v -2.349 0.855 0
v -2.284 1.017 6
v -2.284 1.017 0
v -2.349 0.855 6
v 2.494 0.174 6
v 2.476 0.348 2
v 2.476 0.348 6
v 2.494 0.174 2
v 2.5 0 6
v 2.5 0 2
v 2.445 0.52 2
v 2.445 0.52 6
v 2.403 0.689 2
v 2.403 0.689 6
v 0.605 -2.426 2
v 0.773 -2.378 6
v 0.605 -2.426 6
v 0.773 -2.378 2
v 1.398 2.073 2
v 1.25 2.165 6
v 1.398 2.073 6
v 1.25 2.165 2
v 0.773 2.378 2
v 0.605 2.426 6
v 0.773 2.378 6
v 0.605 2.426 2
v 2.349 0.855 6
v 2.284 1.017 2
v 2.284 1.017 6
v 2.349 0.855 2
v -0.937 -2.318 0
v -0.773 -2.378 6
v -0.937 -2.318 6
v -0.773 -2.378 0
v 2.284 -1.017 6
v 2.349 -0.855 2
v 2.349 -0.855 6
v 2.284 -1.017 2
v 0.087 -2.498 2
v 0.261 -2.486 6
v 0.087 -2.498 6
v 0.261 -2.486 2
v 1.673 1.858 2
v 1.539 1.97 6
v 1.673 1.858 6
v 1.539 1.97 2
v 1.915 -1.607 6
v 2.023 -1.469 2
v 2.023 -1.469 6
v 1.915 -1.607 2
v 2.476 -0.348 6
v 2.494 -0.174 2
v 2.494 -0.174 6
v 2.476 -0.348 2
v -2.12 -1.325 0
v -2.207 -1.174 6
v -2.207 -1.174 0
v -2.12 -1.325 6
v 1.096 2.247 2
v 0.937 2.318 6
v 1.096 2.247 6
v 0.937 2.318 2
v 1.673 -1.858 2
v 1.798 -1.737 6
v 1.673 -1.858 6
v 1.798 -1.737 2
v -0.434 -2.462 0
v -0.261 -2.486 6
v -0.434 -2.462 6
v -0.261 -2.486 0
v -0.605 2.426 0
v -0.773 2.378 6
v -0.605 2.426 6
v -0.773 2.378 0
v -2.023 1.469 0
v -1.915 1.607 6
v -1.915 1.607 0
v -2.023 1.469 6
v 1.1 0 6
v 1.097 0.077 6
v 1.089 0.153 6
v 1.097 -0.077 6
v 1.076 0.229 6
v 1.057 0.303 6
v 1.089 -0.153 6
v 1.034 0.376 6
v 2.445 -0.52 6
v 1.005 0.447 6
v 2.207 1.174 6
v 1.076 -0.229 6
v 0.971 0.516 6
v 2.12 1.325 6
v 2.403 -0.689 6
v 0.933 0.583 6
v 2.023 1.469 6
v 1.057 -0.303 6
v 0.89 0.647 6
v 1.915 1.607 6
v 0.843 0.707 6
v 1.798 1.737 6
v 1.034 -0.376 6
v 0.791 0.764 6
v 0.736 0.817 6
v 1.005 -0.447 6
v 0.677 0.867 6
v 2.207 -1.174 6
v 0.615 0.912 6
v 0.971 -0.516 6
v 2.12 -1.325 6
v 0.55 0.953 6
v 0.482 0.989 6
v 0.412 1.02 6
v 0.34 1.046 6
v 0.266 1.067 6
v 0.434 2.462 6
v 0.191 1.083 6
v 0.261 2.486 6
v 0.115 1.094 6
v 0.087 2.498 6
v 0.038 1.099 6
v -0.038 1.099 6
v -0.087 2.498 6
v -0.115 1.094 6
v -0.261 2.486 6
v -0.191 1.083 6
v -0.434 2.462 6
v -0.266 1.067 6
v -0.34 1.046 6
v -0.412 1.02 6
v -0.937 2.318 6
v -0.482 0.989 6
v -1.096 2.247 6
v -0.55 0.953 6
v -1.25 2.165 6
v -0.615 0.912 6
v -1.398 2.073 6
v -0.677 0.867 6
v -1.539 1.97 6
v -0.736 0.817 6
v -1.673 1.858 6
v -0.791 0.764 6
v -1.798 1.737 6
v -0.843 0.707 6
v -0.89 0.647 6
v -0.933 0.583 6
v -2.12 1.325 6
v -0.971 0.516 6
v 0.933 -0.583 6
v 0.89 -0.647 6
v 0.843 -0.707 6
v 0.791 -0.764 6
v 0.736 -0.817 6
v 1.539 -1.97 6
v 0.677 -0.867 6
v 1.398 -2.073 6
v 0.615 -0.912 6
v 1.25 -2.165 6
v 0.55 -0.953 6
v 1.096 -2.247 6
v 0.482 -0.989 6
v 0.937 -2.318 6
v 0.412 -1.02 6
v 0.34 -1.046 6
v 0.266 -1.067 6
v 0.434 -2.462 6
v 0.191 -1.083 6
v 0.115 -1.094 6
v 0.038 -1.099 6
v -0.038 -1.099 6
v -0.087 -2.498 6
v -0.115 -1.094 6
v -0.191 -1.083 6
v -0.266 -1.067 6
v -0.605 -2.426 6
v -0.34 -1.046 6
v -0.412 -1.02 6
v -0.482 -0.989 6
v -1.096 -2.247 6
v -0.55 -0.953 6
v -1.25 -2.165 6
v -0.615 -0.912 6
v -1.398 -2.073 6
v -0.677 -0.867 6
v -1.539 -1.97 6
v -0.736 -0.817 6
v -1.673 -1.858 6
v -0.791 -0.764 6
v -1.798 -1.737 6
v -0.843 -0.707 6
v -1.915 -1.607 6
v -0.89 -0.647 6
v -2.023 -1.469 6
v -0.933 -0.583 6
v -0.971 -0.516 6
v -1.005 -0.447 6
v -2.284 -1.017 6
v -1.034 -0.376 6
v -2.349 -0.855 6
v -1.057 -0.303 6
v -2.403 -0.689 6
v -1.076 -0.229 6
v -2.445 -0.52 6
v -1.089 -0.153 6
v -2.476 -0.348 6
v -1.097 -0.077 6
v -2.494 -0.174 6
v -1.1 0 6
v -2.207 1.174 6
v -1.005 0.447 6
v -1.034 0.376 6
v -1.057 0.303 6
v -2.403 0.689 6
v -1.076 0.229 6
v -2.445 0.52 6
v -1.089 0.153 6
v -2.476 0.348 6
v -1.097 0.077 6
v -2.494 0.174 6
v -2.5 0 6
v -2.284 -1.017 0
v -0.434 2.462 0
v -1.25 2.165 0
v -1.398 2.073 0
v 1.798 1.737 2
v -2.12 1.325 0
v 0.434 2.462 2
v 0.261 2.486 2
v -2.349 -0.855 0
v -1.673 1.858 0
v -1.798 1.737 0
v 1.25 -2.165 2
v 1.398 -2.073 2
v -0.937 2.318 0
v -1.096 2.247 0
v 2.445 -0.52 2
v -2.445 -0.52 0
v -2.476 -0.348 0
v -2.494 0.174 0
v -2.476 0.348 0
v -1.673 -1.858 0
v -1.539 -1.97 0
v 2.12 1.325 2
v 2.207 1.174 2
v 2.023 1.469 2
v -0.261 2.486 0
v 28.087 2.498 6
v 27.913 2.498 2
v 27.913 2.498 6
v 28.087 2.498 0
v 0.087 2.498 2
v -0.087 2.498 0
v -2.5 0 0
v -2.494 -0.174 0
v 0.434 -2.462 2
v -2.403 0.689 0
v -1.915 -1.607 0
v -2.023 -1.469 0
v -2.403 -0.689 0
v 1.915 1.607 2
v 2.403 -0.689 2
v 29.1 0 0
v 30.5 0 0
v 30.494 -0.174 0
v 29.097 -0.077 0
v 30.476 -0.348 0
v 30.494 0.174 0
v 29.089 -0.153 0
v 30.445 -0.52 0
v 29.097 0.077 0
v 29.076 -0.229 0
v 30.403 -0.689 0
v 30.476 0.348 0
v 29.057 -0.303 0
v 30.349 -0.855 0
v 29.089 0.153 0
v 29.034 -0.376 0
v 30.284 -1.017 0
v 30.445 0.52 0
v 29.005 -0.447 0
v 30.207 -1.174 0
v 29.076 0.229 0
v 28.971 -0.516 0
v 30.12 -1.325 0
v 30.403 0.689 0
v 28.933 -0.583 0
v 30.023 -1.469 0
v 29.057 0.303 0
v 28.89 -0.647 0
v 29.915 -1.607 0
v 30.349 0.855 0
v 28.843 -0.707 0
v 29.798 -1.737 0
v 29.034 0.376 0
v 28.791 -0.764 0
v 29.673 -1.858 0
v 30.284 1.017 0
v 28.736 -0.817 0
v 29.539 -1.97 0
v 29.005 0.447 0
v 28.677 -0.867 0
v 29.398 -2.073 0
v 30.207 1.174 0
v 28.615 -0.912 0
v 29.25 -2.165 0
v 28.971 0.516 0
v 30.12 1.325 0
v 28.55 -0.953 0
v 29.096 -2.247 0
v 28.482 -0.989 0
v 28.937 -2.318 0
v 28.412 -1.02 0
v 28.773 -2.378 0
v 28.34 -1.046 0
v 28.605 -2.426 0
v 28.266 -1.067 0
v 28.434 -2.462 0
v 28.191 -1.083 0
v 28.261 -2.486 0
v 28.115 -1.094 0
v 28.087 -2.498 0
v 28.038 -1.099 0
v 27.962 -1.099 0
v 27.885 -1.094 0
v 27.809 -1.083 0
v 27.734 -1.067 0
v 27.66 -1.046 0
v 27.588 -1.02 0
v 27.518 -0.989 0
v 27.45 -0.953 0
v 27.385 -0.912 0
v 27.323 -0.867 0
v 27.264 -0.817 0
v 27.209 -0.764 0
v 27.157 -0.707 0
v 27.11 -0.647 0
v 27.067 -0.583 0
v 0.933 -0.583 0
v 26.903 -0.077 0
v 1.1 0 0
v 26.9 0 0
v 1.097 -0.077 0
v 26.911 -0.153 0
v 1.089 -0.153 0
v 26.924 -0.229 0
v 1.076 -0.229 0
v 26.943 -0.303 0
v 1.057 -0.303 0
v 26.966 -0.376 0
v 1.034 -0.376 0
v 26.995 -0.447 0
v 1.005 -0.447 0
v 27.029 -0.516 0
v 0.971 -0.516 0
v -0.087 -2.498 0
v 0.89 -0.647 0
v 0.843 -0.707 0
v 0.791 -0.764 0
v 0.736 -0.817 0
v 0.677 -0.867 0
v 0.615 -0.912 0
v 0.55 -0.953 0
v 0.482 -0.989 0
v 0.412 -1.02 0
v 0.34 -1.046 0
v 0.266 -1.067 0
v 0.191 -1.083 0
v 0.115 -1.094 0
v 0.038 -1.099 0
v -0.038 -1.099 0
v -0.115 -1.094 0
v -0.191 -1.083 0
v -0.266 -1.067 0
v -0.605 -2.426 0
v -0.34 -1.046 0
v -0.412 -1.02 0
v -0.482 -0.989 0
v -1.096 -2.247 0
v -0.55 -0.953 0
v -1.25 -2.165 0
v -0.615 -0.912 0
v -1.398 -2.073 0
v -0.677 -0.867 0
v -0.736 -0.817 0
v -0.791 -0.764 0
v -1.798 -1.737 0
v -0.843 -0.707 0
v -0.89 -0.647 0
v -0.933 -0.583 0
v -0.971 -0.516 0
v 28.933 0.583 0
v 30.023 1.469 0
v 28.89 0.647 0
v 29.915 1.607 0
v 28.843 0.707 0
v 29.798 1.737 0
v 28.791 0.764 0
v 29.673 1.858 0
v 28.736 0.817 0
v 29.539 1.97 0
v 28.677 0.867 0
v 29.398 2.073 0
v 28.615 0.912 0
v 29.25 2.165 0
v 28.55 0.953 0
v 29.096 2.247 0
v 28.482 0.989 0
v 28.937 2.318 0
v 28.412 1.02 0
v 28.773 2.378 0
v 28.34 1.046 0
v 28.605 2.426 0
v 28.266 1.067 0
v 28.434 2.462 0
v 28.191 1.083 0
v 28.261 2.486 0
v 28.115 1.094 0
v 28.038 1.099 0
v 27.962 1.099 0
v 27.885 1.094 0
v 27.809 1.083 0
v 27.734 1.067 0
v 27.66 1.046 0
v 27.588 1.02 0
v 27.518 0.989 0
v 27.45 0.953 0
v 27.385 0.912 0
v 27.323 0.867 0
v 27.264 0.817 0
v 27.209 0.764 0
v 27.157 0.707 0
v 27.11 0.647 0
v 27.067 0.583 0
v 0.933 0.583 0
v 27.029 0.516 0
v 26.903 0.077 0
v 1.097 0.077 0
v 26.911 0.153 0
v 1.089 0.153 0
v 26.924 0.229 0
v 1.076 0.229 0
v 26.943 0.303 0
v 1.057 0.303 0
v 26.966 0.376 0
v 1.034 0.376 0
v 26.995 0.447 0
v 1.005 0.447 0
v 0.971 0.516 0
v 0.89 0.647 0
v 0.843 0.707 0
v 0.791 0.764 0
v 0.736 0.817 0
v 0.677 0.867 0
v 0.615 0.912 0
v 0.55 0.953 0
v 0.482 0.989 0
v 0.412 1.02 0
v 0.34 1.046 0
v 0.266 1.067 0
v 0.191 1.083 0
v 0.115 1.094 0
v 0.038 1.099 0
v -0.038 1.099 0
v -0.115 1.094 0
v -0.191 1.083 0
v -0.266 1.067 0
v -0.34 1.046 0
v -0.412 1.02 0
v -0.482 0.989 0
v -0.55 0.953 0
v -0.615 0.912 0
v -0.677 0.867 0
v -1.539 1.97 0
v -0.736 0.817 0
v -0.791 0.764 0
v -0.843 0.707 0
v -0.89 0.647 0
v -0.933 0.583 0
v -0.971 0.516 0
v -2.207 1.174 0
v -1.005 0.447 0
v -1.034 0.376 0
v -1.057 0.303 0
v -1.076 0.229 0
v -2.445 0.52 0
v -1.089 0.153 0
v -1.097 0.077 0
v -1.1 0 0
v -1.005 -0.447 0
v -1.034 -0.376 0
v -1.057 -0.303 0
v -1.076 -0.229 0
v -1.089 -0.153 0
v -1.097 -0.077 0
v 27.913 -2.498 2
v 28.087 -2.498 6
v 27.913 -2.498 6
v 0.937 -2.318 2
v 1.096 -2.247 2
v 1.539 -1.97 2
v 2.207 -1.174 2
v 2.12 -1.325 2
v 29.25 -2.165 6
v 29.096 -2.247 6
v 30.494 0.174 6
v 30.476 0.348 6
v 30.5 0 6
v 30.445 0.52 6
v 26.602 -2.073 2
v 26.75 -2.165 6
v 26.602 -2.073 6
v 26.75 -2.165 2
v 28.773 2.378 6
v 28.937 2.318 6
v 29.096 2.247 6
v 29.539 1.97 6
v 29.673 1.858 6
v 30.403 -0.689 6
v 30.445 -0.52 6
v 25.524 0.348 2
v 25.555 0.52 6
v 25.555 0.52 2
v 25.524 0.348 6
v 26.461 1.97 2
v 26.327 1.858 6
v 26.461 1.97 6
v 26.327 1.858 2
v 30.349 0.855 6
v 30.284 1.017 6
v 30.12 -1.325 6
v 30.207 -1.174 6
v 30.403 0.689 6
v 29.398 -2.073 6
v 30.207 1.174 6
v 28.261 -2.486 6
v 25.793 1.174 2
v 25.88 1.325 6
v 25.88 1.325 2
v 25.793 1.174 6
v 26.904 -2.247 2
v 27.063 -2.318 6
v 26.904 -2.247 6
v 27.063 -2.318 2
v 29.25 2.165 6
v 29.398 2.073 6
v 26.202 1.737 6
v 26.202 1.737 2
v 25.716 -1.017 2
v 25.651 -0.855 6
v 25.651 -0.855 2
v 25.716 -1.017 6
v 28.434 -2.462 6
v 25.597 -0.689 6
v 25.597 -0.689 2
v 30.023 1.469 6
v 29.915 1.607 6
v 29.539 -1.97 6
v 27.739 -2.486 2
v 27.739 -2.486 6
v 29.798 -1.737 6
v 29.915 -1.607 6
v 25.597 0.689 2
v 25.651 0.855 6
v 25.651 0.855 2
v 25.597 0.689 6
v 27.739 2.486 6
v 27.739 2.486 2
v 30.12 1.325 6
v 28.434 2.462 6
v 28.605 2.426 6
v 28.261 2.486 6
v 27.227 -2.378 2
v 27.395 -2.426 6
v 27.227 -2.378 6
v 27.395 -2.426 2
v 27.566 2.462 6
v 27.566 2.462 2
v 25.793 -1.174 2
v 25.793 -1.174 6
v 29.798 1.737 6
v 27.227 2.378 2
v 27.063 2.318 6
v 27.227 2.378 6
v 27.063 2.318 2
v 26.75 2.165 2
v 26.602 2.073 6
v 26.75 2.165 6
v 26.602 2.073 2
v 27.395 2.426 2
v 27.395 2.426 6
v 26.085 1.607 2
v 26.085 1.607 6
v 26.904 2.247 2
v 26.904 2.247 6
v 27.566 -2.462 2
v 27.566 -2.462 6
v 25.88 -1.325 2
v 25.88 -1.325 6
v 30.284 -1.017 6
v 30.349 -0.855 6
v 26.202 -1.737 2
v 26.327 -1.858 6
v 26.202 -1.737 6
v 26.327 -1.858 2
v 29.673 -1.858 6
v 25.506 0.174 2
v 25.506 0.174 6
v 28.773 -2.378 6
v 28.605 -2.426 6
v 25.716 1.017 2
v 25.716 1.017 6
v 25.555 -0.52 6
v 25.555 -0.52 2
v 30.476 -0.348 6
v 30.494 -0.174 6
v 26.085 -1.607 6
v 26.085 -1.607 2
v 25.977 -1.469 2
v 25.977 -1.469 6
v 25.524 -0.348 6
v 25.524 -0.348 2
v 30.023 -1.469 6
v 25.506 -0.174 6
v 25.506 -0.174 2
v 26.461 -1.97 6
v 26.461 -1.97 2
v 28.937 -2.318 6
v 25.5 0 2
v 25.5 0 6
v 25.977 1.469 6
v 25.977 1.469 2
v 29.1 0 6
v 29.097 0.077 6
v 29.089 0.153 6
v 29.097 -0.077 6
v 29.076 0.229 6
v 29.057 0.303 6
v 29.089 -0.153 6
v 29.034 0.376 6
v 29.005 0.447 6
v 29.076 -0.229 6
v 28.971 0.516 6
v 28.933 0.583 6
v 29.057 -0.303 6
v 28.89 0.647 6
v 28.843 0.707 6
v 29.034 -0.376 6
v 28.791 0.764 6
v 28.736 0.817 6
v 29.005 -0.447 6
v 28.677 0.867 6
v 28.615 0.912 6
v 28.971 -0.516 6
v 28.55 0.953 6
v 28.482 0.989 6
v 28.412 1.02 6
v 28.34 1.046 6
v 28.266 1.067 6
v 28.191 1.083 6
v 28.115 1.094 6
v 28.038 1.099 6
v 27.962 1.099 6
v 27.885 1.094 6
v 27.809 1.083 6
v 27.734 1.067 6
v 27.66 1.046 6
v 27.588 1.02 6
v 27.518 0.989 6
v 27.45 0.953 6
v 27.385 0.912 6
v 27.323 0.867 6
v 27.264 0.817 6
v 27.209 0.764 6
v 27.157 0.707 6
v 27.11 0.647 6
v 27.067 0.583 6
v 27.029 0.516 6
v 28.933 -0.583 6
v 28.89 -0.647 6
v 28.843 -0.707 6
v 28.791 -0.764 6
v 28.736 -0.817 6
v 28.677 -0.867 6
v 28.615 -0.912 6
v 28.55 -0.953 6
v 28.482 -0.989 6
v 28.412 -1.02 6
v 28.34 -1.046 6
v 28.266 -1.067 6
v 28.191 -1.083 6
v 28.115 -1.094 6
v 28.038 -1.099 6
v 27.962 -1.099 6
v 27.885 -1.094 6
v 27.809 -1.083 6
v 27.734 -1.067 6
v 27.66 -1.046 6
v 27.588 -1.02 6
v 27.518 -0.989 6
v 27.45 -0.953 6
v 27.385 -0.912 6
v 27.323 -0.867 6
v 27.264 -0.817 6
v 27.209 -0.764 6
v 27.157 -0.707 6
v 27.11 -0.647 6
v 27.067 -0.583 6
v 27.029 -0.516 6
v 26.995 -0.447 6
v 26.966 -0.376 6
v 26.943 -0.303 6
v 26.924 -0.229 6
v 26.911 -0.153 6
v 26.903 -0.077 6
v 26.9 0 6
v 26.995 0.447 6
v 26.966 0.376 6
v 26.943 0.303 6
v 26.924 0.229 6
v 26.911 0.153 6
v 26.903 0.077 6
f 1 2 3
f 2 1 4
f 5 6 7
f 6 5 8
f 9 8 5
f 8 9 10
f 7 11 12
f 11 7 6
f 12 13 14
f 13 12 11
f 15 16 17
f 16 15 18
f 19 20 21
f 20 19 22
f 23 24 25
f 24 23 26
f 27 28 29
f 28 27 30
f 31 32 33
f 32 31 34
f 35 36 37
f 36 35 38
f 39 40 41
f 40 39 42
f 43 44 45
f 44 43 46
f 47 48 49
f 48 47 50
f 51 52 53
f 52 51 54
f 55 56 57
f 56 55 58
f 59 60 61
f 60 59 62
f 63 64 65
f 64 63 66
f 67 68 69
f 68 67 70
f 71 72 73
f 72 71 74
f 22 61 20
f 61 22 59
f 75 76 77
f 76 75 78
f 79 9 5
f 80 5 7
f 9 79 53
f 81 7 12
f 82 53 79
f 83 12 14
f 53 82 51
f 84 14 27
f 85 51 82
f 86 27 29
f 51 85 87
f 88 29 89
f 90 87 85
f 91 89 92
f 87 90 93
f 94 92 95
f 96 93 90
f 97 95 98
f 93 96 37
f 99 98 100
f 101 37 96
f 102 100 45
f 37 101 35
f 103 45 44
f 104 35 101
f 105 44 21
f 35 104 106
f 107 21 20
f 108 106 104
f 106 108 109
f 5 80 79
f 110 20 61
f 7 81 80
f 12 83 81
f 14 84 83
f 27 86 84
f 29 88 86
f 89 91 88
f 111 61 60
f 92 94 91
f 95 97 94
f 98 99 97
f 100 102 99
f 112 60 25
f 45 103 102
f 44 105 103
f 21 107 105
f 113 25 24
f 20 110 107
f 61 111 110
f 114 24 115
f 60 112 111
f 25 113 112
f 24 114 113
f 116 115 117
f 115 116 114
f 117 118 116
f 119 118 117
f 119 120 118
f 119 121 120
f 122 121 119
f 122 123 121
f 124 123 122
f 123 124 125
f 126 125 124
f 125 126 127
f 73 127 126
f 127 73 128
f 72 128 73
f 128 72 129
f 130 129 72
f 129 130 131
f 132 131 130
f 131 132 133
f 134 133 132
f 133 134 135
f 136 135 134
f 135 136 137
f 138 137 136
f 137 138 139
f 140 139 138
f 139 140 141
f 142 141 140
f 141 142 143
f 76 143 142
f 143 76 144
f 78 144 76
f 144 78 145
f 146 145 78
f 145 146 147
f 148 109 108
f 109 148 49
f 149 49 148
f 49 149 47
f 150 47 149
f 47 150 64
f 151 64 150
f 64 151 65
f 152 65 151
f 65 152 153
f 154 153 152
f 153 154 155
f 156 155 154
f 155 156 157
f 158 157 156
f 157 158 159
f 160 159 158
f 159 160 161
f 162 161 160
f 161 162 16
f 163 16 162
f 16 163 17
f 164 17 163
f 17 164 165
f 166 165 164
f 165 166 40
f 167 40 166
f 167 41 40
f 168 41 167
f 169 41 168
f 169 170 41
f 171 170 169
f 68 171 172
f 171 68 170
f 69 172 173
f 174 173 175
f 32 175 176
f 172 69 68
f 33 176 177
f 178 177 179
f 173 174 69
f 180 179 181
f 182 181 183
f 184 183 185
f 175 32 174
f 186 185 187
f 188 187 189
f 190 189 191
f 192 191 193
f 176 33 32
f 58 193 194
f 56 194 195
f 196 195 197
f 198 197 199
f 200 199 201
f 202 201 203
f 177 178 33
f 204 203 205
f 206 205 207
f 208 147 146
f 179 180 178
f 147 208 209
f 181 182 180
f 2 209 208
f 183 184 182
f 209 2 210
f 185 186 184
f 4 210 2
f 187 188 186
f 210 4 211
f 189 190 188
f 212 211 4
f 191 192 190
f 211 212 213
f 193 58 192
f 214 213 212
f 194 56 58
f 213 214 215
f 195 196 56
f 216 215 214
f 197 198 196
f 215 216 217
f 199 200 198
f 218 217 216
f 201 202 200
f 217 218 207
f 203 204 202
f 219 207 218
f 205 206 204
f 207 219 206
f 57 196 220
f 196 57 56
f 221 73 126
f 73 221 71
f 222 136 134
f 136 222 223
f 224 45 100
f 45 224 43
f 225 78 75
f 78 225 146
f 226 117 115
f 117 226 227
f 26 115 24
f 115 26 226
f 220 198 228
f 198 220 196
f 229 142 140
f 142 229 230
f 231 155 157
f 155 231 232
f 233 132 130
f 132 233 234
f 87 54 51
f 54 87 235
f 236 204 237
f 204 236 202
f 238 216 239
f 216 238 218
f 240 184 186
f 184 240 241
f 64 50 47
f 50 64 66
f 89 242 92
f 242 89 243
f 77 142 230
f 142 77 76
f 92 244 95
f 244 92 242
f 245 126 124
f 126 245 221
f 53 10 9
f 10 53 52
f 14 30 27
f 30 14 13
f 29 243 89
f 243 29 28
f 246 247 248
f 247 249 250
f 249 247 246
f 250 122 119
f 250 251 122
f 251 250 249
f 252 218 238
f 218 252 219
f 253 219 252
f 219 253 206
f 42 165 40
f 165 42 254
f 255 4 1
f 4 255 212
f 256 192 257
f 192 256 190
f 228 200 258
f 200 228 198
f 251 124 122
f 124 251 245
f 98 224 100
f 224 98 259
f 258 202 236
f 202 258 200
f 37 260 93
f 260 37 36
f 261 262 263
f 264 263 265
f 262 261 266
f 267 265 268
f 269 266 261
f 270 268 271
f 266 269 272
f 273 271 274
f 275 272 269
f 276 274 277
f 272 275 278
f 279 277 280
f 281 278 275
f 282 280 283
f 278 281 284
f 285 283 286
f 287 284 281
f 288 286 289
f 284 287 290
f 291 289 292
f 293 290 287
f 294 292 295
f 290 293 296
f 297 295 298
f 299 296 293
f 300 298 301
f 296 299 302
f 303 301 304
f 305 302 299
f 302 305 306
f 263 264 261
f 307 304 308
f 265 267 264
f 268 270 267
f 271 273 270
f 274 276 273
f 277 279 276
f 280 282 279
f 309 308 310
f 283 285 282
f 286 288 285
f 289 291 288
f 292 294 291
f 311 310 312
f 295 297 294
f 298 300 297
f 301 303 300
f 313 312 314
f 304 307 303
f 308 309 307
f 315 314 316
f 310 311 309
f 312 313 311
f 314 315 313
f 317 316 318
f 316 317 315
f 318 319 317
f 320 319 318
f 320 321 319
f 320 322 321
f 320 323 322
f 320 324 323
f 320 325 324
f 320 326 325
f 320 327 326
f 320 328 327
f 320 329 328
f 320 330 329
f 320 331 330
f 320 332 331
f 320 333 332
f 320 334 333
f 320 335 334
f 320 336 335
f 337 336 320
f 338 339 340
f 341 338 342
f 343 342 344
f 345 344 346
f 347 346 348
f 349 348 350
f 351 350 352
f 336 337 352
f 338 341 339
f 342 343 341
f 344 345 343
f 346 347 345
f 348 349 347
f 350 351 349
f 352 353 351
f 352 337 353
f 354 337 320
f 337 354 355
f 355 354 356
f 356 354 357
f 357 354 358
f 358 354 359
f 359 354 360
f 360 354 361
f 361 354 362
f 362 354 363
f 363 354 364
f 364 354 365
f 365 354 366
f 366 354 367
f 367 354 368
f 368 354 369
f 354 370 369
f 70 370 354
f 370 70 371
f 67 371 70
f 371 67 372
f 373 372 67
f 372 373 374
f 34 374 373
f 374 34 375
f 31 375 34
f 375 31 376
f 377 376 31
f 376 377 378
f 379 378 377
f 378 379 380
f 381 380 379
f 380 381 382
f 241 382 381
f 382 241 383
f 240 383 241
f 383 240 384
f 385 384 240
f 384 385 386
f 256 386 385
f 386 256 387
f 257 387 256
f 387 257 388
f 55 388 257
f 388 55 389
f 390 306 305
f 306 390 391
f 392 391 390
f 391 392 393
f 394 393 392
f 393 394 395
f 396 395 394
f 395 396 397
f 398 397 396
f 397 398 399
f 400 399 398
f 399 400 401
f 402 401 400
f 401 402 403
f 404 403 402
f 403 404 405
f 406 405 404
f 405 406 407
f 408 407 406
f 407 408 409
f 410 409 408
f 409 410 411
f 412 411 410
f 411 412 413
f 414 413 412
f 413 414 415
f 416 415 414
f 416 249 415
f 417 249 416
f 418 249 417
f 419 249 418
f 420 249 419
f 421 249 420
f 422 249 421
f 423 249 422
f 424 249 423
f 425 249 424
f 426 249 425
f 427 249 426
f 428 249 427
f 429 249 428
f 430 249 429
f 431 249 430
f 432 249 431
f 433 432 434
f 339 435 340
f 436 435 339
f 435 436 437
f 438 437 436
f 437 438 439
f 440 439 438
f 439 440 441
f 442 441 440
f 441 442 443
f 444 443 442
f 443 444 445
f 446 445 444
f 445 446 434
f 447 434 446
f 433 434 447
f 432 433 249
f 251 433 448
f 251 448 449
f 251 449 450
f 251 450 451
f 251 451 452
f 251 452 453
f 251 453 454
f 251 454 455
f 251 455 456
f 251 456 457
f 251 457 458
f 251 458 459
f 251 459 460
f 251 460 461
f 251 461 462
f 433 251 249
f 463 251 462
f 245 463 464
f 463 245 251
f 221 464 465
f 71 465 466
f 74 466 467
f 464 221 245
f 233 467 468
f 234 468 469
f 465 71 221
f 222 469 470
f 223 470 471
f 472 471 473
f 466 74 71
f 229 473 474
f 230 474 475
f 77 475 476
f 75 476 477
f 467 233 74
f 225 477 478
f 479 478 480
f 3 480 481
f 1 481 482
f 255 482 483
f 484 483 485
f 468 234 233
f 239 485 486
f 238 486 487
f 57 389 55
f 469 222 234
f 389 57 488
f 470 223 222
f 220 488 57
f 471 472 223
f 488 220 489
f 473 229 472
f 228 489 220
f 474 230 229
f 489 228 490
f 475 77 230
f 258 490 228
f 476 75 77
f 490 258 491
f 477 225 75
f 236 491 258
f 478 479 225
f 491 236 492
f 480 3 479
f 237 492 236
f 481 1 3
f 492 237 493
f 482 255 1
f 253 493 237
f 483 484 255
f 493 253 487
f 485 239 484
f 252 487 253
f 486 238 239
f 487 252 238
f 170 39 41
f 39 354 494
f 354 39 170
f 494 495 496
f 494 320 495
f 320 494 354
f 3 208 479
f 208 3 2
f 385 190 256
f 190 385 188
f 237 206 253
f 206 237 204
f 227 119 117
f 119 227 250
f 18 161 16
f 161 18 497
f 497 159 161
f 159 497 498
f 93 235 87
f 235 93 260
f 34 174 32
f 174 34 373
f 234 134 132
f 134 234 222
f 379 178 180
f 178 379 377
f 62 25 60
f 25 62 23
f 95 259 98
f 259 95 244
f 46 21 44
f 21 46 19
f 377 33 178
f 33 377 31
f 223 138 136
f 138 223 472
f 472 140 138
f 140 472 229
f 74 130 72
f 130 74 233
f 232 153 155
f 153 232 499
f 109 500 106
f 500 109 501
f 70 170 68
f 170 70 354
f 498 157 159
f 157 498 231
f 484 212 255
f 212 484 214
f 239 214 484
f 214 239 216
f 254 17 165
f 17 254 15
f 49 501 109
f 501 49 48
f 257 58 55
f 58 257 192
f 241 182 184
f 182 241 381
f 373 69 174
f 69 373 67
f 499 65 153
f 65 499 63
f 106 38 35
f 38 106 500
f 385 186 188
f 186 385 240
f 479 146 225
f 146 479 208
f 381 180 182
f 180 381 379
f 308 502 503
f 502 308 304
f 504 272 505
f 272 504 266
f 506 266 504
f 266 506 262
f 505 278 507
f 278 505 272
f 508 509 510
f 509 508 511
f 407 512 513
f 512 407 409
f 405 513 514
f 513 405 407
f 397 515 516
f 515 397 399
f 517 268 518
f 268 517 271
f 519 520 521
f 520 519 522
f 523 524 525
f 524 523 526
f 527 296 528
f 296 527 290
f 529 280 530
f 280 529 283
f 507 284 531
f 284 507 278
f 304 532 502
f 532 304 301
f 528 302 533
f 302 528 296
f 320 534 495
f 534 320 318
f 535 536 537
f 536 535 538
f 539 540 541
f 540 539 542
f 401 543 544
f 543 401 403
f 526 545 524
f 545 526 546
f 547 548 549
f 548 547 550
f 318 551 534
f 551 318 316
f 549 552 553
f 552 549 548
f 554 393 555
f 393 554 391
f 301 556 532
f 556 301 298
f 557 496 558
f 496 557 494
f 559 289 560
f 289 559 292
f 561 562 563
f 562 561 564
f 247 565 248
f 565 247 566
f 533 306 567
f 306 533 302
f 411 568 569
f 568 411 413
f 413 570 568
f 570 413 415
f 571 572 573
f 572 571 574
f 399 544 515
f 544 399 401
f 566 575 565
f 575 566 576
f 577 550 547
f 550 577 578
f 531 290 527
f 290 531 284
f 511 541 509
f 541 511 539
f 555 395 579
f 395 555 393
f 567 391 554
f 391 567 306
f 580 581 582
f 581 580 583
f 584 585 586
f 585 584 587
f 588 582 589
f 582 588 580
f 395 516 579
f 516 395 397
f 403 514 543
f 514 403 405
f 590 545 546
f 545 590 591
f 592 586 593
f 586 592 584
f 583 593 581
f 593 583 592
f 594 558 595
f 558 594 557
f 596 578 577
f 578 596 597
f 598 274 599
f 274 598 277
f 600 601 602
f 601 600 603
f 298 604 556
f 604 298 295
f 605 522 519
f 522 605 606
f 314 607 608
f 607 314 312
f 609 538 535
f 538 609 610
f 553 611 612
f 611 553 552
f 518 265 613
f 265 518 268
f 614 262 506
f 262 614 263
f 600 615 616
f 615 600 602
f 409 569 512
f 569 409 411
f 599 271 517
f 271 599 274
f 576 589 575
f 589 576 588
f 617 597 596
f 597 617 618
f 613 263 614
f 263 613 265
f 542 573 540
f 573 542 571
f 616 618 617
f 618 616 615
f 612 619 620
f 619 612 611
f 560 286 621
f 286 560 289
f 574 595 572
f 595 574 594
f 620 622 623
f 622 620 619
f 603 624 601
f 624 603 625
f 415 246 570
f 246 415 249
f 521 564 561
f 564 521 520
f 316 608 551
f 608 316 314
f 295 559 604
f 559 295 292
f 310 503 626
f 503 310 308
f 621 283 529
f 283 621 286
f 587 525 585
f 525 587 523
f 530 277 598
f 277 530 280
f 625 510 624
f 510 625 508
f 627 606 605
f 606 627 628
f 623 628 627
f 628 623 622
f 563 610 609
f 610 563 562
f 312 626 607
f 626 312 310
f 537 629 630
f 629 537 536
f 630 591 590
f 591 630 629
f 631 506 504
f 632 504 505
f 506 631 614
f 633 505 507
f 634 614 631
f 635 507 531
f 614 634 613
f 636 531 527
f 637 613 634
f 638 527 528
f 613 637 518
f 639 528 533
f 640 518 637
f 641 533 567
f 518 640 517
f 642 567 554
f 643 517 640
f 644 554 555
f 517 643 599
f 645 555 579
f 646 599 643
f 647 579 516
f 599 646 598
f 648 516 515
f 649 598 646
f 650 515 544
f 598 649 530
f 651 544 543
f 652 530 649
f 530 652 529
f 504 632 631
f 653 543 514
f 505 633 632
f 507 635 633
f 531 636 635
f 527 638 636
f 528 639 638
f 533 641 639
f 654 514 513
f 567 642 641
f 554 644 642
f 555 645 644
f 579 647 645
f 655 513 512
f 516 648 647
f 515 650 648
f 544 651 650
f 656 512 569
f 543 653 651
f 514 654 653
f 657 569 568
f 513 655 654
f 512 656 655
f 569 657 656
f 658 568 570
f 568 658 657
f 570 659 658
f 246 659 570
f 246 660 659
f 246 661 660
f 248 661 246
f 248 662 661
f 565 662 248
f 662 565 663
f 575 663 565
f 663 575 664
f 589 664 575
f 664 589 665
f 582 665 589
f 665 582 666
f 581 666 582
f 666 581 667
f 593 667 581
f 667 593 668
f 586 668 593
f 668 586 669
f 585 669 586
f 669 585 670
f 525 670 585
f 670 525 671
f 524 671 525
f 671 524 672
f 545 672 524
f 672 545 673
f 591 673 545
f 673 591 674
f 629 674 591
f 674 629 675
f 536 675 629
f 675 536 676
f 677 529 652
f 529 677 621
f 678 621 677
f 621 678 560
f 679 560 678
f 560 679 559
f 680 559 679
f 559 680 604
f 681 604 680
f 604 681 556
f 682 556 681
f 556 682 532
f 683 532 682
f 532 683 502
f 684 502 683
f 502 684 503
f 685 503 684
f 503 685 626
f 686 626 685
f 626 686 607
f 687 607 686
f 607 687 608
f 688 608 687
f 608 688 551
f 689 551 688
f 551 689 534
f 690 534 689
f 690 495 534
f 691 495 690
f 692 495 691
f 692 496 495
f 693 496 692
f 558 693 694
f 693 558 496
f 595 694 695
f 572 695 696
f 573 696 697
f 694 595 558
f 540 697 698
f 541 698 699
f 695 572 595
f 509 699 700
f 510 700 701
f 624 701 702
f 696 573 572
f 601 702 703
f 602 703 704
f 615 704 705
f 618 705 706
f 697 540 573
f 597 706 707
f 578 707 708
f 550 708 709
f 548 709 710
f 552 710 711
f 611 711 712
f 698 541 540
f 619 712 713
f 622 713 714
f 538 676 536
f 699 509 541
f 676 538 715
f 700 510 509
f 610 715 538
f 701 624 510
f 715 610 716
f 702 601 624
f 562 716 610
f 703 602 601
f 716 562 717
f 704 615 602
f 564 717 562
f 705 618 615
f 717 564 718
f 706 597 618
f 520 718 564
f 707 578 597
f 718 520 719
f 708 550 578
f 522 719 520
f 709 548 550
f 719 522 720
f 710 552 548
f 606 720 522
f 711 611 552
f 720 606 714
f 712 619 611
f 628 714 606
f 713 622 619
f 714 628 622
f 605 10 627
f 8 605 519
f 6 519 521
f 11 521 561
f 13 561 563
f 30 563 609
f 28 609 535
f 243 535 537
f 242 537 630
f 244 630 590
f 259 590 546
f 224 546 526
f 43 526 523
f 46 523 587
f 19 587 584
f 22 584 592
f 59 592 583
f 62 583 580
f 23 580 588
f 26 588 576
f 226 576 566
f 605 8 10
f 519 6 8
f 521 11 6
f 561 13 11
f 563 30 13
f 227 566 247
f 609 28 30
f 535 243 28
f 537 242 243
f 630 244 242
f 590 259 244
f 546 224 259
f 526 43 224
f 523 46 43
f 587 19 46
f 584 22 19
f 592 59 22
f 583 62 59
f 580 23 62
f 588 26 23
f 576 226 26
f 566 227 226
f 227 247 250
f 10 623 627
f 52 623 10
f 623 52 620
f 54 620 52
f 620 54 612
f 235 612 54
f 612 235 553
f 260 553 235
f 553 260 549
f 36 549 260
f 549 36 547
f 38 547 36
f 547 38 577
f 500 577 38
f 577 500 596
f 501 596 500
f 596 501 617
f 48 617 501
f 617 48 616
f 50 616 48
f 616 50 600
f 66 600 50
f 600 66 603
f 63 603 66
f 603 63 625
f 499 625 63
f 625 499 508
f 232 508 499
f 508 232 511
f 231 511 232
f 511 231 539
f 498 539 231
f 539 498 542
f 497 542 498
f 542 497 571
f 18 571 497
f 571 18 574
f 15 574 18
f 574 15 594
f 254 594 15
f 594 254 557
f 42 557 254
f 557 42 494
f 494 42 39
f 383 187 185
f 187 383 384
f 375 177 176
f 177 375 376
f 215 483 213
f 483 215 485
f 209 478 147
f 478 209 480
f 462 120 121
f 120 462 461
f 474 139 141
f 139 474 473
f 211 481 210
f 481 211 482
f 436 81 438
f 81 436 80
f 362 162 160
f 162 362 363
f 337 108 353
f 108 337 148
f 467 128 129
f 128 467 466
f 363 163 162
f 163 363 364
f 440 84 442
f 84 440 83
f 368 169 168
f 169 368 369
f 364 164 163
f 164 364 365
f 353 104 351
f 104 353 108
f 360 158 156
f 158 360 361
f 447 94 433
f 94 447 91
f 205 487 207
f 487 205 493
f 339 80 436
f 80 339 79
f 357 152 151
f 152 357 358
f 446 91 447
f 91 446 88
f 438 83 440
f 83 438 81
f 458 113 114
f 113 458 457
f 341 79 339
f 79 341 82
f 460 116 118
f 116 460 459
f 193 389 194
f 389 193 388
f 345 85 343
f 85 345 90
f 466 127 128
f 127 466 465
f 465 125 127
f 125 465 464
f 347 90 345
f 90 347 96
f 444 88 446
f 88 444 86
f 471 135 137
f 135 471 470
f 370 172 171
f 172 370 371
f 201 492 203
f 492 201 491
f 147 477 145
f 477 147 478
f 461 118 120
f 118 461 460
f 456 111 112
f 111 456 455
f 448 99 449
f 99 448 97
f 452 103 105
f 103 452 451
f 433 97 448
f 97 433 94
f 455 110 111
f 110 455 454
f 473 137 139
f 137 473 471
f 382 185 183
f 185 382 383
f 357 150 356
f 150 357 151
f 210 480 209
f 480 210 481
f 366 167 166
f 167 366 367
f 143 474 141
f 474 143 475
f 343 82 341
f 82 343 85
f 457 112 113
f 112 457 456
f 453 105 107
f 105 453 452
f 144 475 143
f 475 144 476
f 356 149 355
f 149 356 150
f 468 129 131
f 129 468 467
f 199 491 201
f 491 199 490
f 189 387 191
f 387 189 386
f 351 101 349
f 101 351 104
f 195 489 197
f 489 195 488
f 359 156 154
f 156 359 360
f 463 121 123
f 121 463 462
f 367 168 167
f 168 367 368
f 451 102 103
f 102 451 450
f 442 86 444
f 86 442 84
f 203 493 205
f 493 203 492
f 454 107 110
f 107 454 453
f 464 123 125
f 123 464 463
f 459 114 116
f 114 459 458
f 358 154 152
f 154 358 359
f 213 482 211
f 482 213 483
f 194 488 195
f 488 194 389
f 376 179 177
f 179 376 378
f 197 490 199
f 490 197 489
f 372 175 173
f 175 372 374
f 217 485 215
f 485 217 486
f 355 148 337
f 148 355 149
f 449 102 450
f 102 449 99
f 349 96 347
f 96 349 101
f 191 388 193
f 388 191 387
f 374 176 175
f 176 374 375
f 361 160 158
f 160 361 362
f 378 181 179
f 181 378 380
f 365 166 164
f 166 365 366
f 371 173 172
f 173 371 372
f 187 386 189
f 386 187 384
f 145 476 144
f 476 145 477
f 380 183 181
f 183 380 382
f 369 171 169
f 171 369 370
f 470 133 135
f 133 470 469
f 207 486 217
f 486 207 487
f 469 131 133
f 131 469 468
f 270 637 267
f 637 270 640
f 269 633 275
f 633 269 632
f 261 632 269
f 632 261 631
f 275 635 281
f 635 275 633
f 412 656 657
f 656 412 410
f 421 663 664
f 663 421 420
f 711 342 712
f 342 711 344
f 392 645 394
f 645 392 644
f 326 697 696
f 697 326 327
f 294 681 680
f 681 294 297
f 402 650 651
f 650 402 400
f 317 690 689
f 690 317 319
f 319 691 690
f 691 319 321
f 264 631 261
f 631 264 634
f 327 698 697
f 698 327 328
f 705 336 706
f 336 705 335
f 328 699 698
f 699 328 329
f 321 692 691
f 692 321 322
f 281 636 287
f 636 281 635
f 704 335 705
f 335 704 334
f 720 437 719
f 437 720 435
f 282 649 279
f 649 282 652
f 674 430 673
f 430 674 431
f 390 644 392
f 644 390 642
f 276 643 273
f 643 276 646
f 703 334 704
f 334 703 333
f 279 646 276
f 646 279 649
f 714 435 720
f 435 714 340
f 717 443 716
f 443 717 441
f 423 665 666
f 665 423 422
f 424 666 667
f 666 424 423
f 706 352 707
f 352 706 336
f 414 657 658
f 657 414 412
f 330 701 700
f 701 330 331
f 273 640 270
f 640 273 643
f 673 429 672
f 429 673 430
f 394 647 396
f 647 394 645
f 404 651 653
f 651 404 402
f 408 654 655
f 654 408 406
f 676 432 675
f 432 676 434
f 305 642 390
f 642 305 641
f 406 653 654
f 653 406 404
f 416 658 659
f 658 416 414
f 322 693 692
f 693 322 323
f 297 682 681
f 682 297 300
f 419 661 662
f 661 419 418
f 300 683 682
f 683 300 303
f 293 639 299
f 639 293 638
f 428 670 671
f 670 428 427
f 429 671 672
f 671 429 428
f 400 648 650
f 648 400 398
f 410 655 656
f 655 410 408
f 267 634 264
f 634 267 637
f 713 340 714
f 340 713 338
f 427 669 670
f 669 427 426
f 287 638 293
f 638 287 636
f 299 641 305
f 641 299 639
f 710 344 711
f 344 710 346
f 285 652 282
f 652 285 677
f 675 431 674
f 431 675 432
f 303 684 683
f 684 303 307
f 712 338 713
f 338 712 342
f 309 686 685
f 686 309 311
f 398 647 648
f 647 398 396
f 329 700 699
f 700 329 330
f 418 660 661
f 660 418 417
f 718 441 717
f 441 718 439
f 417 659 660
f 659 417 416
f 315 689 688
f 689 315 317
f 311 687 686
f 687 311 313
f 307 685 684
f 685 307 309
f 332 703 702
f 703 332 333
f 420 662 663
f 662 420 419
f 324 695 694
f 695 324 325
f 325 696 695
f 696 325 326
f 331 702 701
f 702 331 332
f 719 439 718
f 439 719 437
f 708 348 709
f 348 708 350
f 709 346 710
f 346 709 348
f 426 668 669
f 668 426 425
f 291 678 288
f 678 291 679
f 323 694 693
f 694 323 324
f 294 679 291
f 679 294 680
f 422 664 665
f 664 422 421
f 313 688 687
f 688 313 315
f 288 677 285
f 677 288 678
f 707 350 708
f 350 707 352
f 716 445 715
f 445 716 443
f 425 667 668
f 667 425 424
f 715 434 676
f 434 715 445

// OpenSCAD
$fn=90;
hole_r = 2.2/2;
tube_r = 5/2;
hole_dx = 28;
h1 = 6;
h2 = 2;
difference() {
    union() {
        cylinder(r=tube_r,h=h1);
        translate([hole_dx,0,0]) cylinder(r=tube_r,h=h1);
        hull() {
        cylinder(r=tube_r,h=h2);
        translate([hole_dx,0,0]) cylinder(r=tube_r,h=h2);
        }
    }
    cylinder(r=hole_r,h=h1);
    translate([hole_dx,0,0]) cylinder(r=hole_r,h=h1);
}
